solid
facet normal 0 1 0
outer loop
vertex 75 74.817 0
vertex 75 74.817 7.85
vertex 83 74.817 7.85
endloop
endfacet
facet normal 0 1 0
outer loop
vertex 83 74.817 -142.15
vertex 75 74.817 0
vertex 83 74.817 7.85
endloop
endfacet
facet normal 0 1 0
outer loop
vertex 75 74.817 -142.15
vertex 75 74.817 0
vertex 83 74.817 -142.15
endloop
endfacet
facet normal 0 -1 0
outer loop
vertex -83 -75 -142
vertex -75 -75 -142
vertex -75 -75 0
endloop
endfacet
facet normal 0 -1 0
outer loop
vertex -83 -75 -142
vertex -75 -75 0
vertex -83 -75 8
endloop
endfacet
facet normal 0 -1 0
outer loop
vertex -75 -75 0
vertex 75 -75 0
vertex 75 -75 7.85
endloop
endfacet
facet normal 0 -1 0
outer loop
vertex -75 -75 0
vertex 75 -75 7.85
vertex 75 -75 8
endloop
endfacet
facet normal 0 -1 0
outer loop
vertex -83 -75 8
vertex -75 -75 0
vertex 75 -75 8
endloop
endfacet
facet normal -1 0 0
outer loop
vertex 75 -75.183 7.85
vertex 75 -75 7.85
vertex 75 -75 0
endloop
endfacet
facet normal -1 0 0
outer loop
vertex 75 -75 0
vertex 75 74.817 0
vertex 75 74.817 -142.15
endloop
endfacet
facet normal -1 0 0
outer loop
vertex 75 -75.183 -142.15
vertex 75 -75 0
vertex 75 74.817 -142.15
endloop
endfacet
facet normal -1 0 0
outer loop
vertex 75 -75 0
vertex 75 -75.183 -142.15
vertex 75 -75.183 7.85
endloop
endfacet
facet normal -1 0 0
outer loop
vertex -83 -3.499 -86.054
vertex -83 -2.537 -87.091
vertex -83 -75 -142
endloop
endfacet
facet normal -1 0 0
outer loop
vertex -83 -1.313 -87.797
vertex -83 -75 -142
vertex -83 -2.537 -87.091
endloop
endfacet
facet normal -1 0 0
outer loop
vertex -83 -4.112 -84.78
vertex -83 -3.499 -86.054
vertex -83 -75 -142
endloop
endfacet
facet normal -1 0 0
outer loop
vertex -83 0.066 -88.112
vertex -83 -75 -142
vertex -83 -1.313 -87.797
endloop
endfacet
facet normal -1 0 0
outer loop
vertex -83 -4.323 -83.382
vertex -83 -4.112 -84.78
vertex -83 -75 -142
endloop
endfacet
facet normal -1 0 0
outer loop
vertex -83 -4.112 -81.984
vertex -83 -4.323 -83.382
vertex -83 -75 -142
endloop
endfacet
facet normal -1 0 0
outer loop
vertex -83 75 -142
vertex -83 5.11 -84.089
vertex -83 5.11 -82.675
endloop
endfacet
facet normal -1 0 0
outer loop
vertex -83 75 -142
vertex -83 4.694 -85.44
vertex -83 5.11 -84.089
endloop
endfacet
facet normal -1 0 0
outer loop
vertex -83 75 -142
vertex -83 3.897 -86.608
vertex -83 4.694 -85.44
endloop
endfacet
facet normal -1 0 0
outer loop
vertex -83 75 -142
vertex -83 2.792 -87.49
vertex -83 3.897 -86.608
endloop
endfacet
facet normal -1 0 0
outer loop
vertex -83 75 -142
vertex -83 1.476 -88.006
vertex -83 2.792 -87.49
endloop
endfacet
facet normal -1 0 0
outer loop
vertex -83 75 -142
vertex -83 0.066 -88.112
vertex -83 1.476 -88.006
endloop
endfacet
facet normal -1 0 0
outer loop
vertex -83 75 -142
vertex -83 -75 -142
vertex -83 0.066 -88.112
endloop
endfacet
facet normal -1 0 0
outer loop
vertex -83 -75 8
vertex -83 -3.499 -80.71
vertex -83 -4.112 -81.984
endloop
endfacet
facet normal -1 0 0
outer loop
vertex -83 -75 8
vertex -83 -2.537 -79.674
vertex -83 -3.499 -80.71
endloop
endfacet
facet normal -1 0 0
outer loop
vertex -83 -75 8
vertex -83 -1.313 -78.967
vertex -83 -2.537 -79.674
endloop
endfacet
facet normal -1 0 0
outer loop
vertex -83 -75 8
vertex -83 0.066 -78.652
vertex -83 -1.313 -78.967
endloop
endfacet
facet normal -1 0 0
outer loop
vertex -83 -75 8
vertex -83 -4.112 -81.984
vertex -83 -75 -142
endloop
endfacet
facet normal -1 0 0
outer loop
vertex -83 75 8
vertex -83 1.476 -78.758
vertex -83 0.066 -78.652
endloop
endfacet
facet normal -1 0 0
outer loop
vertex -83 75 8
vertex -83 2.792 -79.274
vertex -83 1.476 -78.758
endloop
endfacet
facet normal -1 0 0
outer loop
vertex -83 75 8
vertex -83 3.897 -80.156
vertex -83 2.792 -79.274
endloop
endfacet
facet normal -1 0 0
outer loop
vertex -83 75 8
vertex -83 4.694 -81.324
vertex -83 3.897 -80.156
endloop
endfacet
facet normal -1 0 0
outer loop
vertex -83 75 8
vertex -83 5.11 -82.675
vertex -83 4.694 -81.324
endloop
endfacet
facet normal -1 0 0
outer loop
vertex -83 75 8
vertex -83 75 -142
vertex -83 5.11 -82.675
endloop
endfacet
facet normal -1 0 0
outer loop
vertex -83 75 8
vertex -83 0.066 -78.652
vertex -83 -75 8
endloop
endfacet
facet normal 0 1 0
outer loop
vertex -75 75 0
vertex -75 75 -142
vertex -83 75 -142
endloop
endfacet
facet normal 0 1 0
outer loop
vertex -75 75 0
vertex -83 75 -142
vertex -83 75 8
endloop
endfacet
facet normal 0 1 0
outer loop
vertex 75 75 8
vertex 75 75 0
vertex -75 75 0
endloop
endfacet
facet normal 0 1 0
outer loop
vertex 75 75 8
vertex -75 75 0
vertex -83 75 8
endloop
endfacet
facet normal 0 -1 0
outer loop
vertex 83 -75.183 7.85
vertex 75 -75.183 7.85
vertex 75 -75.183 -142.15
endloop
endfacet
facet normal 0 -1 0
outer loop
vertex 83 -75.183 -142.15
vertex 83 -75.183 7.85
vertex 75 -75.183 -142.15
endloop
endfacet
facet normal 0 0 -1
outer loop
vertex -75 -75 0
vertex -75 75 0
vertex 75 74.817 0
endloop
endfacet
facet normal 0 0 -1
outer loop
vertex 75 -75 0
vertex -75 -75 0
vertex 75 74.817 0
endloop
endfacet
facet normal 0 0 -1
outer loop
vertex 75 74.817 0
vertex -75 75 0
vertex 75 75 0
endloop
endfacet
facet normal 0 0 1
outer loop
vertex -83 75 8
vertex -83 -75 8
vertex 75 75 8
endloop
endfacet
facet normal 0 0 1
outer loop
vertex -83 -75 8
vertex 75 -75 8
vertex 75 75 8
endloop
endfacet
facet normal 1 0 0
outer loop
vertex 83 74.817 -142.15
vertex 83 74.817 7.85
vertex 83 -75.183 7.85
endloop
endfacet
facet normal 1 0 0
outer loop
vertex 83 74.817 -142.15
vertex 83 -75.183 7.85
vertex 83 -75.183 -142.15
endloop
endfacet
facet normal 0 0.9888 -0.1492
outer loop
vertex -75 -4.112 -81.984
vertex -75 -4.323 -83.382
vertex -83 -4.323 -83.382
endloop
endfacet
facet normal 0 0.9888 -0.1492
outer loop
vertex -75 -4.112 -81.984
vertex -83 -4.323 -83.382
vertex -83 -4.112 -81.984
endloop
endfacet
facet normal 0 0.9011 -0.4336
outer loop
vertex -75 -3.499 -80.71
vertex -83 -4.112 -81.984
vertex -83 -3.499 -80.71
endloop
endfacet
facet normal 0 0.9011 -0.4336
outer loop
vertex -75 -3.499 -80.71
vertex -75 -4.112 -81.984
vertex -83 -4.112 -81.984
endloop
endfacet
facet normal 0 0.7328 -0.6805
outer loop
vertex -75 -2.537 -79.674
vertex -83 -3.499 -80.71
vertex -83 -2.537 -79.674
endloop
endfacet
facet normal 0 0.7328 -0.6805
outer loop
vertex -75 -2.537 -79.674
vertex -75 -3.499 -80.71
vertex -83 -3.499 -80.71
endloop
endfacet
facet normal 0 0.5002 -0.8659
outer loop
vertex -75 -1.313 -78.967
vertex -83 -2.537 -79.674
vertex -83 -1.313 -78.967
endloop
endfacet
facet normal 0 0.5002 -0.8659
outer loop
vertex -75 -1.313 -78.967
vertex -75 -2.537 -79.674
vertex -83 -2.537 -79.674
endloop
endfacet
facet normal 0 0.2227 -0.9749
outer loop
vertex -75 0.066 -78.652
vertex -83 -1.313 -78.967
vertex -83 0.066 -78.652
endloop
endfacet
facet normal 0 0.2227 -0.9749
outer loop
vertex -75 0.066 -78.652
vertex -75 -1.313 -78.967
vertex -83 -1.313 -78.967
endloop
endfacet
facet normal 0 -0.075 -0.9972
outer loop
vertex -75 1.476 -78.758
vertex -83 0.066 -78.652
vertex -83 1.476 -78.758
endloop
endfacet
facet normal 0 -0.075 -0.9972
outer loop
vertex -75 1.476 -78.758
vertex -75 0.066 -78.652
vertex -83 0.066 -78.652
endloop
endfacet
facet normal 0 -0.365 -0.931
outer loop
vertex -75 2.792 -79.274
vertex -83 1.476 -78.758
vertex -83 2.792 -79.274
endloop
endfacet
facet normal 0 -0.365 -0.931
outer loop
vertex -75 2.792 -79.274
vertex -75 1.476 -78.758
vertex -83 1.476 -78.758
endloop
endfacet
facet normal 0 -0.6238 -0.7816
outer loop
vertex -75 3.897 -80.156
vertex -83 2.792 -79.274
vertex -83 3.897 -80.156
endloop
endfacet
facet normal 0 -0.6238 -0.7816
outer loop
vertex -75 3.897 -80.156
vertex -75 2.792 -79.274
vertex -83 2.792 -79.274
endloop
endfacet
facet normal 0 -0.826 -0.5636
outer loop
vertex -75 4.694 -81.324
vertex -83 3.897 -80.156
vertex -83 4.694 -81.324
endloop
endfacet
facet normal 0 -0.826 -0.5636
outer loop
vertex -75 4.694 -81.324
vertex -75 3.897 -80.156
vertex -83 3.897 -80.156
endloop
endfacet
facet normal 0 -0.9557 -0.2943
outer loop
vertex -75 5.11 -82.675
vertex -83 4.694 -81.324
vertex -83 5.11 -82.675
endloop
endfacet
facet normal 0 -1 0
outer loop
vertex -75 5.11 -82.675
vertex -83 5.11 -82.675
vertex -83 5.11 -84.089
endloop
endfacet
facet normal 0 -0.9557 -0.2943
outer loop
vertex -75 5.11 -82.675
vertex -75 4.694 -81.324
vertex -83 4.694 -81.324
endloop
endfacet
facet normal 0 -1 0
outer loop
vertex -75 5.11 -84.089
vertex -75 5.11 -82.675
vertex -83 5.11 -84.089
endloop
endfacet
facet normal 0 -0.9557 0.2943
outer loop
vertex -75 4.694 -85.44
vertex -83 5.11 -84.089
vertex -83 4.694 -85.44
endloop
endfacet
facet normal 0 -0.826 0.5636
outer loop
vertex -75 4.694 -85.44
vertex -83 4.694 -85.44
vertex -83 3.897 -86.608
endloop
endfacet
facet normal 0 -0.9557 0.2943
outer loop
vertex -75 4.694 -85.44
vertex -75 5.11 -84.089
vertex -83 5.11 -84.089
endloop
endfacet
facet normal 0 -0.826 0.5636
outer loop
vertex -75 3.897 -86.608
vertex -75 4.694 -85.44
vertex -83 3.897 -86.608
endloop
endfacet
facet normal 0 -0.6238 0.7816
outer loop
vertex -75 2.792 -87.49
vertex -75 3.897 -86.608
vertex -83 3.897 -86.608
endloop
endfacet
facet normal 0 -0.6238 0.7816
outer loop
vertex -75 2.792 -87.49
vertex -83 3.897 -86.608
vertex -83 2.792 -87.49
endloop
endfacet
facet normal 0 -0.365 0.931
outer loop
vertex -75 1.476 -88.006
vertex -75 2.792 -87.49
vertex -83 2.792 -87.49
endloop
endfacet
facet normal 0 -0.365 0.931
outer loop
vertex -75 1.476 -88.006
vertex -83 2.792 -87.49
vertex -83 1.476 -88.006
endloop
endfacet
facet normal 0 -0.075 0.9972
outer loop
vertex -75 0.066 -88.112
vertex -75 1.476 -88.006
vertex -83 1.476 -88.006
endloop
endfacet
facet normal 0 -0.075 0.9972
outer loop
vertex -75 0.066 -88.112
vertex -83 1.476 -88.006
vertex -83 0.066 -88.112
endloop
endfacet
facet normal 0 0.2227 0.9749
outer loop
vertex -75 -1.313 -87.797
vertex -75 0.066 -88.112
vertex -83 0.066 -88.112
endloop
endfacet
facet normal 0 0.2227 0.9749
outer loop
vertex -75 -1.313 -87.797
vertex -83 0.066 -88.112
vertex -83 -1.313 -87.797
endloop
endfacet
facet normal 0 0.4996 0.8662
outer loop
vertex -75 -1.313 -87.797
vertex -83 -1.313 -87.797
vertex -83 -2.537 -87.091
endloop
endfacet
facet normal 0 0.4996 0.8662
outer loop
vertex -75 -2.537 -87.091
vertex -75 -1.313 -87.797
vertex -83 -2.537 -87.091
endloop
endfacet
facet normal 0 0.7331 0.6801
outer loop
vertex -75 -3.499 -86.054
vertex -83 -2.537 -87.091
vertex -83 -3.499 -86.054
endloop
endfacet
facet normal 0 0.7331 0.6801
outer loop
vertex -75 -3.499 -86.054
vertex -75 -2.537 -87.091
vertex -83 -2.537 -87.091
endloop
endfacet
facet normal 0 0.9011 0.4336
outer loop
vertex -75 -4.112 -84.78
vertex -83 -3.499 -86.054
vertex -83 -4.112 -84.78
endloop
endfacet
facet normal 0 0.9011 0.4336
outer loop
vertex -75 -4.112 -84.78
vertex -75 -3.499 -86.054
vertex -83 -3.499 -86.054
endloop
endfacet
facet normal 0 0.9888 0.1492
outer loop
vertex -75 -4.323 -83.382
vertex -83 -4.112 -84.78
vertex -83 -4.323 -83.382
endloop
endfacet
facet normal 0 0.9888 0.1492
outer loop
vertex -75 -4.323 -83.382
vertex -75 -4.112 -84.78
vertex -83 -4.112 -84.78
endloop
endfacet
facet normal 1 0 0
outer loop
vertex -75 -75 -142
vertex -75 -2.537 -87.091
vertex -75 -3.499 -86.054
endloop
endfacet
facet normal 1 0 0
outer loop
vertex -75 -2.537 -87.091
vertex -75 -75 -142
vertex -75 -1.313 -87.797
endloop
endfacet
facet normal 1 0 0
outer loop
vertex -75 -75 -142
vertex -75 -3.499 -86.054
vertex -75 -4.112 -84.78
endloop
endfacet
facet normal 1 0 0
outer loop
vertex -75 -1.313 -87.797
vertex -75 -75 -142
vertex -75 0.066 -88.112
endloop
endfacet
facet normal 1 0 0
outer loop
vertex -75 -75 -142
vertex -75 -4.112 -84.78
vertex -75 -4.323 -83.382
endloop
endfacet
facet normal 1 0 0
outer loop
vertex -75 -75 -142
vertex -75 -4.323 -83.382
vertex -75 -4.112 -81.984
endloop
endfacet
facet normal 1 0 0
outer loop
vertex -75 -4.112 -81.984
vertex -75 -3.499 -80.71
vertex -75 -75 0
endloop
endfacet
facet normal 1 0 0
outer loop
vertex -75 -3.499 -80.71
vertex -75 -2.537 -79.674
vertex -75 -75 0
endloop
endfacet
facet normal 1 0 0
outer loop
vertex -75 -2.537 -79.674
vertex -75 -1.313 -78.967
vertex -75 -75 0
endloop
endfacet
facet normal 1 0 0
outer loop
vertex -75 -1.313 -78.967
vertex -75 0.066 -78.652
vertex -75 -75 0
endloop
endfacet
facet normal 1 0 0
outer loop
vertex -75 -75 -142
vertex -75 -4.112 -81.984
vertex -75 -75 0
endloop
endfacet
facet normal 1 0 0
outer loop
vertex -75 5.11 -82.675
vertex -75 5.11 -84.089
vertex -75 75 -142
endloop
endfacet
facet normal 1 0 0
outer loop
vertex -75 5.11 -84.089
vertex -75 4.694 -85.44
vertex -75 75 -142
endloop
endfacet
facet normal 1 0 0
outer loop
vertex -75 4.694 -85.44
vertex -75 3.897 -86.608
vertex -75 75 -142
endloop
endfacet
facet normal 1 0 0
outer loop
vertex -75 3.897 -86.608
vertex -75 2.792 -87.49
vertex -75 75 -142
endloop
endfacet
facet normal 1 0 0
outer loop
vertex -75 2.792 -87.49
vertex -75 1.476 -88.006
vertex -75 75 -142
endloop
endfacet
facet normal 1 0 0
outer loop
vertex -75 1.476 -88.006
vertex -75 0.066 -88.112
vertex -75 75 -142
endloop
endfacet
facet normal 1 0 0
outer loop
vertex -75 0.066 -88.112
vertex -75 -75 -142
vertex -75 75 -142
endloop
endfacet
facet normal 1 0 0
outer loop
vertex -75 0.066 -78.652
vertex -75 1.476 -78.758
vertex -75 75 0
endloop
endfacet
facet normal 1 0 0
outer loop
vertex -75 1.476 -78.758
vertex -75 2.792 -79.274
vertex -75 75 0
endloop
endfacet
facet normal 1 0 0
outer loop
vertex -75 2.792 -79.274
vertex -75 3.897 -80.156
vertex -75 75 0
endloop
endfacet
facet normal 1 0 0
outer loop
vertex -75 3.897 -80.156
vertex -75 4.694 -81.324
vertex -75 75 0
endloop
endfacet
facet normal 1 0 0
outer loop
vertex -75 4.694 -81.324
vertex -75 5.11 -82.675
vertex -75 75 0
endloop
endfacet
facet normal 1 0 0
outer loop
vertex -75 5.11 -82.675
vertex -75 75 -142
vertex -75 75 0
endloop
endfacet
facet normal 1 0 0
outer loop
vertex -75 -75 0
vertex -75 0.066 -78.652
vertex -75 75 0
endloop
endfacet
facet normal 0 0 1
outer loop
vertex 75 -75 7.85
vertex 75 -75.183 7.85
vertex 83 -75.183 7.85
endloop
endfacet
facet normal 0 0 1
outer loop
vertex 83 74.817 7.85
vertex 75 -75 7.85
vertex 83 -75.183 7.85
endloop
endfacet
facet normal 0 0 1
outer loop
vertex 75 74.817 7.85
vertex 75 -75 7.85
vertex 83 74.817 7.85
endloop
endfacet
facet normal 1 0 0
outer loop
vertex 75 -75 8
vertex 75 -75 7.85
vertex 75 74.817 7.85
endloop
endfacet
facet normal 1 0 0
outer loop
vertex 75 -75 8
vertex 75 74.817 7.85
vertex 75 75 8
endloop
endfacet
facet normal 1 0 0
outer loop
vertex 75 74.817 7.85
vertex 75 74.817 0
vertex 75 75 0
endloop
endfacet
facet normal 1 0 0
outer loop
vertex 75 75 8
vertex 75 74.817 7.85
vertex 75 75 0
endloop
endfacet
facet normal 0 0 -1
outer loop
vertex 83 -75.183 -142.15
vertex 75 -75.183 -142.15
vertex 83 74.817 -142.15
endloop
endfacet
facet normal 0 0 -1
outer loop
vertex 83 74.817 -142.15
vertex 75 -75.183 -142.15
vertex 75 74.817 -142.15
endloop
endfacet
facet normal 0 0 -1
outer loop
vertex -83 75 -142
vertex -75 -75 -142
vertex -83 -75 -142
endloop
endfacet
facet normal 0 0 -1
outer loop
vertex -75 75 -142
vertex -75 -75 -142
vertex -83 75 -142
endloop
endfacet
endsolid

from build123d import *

# Parameters (mm, degrees)
SKETCH1_W           = 150
SKETCH1_H           = 150
BOSS_EXTRUDE1_DEPTH = 8
SKETCH3_W           = 150
SKETCH3_H           = 150
BOSS_EXTRUDE2_DEPTH = 8
SKETCH4_W           = 150
SKETCH4_H           = 150
SKETCH4_R           = 4.743192734
BOSS_EXTRUDE3_DEPTH = 8


with BuildPart() as part:
    # Sketch1 → Boss-Extrude1 (new body)
    with BuildSketch(Plane.XY):
        Rectangle(SKETCH1_W, SKETCH1_H)
    extrude(amount=BOSS_EXTRUDE1_DEPTH)

    # Sketch3 → Boss-Extrude2 (add)
    with BuildSketch(Plane(origin=(75, 0, 0), x_dir=(0, 0, -1), z_dir=(1, 0, 0))):
        with Locations((67.149717674, -0.182693133)):
            Rectangle(SKETCH3_W, SKETCH3_H)
    extrude(amount=BOSS_EXTRUDE2_DEPTH)

    # Sketch4 → Boss-Extrude3 (add)
    with BuildSketch(Plane.ZY.offset(75)):
        with Locations((-67, 0)):
            Rectangle(SKETCH4_W, SKETCH4_H)
        with Locations(Location((-83.382184019, 0.420229312, 0), (0, 0, 270))):
            Circle(SKETCH4_R, mode=Mode.SUBTRACT)
    extrude(amount=BOSS_EXTRUDE3_DEPTH)


solid = part.part
